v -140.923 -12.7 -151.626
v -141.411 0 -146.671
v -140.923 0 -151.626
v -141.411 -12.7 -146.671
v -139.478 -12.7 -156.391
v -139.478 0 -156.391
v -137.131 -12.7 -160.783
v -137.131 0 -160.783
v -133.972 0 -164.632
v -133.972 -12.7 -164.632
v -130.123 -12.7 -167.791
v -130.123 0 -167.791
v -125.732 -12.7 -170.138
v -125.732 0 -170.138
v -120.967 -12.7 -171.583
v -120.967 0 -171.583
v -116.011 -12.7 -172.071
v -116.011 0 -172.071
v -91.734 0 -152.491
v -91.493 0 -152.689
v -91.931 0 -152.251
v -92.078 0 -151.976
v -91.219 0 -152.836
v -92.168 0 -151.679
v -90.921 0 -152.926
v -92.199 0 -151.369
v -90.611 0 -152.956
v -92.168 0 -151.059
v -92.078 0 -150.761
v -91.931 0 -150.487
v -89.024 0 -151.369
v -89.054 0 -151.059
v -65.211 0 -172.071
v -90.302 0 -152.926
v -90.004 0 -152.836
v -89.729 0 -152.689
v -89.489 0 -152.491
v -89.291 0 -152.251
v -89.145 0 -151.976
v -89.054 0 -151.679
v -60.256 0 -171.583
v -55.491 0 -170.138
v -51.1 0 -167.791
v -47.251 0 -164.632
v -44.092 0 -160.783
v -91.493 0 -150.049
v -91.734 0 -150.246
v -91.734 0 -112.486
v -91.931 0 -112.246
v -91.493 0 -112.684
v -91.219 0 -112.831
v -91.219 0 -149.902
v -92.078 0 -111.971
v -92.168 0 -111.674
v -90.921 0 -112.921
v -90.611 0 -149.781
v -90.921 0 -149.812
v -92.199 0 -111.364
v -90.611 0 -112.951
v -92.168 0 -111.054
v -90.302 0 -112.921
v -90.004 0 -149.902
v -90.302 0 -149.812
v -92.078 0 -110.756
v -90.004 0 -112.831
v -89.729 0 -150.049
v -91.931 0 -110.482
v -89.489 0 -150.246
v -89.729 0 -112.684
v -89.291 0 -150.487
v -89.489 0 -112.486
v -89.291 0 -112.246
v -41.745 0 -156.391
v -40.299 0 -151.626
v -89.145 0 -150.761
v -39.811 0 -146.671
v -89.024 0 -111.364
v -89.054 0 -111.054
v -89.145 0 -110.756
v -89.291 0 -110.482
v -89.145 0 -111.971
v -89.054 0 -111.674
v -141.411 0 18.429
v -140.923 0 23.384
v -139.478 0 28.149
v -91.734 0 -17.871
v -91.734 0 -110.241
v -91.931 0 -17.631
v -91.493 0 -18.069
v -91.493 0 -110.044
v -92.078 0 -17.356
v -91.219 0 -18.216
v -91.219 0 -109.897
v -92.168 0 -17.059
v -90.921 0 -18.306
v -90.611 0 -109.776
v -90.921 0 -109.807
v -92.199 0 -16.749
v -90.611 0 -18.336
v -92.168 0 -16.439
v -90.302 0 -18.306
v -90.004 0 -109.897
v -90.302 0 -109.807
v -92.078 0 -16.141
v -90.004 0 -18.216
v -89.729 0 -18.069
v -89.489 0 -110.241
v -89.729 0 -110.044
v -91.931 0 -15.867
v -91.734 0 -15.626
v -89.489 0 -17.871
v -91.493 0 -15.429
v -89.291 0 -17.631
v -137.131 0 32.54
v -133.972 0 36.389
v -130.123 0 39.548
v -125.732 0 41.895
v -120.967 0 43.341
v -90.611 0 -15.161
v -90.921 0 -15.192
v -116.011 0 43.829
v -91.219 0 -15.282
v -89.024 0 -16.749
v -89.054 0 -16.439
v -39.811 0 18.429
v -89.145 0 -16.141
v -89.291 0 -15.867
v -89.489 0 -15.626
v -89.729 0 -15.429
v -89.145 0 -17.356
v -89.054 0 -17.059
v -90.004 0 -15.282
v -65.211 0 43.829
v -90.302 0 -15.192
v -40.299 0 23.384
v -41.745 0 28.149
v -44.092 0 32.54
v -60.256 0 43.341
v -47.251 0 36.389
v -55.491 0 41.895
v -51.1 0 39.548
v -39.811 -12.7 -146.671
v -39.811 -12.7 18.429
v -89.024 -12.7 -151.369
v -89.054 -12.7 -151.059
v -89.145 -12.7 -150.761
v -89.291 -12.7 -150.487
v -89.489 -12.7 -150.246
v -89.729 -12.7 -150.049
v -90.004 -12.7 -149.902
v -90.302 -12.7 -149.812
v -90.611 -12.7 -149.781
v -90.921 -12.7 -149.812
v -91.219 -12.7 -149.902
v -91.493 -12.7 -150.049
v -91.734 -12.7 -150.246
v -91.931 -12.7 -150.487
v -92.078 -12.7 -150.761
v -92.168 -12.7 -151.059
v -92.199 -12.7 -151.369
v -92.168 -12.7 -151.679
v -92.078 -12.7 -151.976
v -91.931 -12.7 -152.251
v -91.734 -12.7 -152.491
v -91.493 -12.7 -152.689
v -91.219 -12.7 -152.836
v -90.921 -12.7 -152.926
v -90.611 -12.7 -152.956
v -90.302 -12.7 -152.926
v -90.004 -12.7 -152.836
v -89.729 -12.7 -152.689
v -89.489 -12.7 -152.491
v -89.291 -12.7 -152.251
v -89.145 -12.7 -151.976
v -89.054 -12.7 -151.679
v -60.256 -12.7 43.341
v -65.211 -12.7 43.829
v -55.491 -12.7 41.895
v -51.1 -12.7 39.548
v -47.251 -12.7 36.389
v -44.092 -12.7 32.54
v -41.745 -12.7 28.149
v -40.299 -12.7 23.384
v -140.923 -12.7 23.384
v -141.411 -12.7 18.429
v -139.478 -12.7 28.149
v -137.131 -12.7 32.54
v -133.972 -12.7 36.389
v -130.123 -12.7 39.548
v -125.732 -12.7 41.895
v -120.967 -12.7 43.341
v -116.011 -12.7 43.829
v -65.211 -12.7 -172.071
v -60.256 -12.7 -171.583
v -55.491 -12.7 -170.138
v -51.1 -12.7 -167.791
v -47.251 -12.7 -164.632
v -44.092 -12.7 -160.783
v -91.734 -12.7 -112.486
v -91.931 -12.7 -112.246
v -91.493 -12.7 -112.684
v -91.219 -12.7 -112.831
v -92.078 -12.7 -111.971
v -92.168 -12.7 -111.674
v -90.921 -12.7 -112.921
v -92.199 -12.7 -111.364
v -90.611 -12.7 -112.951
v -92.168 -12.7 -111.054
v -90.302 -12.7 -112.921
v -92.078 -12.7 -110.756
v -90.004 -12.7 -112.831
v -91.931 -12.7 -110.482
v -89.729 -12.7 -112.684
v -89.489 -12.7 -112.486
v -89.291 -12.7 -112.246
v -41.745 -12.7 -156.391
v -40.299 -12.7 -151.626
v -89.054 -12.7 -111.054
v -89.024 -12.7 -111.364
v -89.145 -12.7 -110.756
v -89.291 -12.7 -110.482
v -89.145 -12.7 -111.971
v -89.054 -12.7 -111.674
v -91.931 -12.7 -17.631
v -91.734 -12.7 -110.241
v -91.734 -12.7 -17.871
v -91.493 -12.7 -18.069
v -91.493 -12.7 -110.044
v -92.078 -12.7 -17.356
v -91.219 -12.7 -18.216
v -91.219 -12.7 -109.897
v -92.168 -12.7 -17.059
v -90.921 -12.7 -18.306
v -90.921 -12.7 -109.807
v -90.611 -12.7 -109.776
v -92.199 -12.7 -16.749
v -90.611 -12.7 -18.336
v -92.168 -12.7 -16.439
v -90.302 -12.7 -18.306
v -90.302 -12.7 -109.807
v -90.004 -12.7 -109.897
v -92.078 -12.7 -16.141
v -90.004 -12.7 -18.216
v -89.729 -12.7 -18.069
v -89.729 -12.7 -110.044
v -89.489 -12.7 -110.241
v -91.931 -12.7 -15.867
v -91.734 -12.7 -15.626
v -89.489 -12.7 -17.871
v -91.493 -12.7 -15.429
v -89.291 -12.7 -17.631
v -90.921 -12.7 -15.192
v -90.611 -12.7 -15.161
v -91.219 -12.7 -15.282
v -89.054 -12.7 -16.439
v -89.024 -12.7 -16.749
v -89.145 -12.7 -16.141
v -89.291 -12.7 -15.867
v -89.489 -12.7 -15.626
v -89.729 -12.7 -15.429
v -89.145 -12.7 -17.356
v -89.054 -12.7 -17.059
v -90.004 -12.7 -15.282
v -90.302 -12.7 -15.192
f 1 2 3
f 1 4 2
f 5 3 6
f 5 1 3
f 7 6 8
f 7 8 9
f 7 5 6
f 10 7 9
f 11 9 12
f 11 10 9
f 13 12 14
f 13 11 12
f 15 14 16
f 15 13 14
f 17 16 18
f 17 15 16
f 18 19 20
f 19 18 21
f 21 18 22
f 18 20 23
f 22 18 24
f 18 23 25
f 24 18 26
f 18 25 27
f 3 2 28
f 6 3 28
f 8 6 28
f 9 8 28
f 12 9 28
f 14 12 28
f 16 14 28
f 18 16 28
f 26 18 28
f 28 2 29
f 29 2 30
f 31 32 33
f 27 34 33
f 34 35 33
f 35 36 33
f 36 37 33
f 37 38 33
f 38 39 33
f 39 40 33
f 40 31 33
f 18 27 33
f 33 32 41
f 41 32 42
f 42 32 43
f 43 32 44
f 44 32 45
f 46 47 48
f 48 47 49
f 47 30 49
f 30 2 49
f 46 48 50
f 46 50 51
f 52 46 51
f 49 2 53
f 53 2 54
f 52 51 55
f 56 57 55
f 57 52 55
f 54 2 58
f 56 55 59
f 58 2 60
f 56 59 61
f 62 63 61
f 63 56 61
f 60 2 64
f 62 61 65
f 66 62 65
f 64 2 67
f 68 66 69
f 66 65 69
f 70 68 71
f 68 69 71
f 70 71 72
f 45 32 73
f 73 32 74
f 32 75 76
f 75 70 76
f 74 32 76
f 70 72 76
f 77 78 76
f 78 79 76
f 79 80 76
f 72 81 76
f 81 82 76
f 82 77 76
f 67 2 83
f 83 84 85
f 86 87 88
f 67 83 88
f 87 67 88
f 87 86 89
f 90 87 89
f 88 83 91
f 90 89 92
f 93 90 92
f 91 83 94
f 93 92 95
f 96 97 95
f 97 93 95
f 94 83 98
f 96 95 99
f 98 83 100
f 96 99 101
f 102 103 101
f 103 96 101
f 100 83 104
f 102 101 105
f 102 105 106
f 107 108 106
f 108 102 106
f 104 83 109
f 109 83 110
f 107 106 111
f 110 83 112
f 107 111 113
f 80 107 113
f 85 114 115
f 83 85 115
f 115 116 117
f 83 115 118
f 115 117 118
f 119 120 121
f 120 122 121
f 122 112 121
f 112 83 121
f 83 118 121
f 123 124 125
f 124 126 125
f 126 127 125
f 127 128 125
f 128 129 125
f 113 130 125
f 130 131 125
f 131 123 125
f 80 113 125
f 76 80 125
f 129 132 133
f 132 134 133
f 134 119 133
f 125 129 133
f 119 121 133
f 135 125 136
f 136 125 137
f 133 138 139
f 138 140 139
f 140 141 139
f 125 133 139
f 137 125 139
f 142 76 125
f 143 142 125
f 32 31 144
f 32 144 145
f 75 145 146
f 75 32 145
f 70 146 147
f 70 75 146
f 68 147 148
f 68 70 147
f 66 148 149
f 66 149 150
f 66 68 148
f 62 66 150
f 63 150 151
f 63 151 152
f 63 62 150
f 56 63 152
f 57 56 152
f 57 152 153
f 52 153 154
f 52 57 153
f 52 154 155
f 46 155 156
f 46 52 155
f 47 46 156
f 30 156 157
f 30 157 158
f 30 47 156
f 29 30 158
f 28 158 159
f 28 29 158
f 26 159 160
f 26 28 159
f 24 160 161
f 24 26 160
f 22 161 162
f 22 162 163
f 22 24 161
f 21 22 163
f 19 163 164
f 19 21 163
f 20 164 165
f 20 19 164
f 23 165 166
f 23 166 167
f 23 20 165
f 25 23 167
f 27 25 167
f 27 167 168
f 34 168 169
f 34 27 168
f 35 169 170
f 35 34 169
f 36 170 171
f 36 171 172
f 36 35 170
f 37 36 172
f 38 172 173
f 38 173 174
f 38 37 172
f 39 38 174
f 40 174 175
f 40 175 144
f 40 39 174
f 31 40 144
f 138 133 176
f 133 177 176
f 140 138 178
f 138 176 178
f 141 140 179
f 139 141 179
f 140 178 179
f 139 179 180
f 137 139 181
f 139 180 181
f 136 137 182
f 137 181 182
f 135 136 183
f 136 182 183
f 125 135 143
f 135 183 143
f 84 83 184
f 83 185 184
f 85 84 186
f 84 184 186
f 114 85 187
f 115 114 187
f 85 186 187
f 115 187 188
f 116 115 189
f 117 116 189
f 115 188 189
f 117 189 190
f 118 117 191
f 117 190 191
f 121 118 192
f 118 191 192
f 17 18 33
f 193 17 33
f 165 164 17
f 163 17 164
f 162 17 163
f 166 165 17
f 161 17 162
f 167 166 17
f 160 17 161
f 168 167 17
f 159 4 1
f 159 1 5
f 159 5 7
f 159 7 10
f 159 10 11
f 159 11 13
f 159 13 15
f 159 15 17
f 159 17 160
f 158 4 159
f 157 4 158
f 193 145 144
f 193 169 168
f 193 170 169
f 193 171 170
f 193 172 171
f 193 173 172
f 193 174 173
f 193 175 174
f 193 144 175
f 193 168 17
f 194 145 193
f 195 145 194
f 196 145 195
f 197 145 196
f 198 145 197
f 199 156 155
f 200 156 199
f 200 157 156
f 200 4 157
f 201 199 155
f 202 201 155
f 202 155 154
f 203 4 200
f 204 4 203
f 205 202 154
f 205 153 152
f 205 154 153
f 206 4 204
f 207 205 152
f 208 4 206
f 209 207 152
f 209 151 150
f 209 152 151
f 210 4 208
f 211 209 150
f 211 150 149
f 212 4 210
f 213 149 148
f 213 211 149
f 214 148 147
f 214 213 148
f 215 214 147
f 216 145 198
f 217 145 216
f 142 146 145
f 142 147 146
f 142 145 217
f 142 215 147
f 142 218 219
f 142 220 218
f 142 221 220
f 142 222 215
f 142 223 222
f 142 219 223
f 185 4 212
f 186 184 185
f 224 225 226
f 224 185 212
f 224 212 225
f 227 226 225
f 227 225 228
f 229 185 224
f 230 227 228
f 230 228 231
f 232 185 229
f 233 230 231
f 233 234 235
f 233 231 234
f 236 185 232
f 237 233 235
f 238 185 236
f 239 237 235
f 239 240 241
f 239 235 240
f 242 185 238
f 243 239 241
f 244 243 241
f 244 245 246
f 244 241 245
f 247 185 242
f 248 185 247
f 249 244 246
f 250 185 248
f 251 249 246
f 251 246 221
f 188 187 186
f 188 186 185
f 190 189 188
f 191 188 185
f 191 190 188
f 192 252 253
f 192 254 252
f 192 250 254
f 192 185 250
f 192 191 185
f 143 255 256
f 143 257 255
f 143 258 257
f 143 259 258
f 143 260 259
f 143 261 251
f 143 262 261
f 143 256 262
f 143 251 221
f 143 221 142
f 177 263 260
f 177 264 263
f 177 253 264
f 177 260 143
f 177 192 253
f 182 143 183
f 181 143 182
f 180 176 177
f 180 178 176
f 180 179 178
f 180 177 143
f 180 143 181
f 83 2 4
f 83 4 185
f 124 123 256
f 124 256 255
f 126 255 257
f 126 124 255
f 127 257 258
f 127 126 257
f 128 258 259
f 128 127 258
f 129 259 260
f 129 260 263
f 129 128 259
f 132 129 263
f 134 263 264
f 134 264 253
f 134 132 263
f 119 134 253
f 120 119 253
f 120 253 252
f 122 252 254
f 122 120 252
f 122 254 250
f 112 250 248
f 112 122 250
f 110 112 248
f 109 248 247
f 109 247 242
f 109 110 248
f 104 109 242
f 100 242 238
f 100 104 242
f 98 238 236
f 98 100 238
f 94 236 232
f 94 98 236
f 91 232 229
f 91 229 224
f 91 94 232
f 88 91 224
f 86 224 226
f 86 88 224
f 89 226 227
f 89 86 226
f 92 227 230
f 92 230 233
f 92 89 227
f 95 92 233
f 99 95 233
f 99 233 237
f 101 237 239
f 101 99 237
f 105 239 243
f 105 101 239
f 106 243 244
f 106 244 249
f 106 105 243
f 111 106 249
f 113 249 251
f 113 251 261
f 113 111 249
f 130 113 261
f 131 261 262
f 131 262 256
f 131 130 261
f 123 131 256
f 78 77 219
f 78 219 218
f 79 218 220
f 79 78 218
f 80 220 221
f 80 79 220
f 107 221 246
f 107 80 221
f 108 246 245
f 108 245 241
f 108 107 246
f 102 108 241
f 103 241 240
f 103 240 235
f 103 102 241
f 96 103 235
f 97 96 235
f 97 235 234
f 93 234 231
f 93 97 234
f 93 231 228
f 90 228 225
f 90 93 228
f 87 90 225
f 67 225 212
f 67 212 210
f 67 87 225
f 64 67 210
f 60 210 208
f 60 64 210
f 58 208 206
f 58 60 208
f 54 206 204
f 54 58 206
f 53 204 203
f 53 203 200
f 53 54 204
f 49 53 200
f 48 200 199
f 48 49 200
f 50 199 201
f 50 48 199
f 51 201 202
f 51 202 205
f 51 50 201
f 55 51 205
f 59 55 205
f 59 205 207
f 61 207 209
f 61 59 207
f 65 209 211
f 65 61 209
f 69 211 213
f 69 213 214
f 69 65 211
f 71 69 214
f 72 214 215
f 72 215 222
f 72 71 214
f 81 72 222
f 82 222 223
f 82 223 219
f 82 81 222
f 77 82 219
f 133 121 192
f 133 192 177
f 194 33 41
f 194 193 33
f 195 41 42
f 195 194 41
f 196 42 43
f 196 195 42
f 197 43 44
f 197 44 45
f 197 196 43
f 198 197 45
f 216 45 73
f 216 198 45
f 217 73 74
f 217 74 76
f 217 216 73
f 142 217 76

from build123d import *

# Parameters (mm, degrees)
F0_W     = 101.6
F0_H     = 215.9
F0_R     = 1.5875
F1_DEPTH = 12.7
F2_R     = 25.4
F3_R     = 25.4
F4_R     = 25.4
F5_R     = 25.4


with BuildPart() as f1:
    # F0 (on Front) → F1 (new body)
    with BuildSketch(Plane.XZ):
        with Locations((-90.611439, -64.121174)):
            Rectangle(F0_W, F0_H)
        with Locations((-90.611439, -111.363955)):
            Circle(F0_R, mode=Mode.SUBTRACT)
        with Locations((-90.611439, -151.368955)):
            Circle(F0_R, mode=Mode.SUBTRACT)
        with Locations((-90.611439, -16.748955)):
            Circle(F0_R, mode=Mode.SUBTRACT)
    extrude(amount=F1_DEPTH)

    # F2
    f2_edges = [f1.edges().sort_by_distance(p)[0] for p in [
        (-141.411439, -6.35, 43.828826),
    ]]
    fillet(f2_edges, radius=F2_R)

    # F3
    f3_edges = [f1.edges().sort_by_distance(p)[0] for p in [
        (-39.811439, -6.35, 43.828826),
    ]]
    fillet(f3_edges, radius=F3_R)

    # F4
    f4_edges = [f1.edges().sort_by_distance(p)[0] for p in [
        (-141.411439, -6.35, -172.071174),
    ]]
    fillet(f4_edges, radius=F4_R)

    # F5
    f5_edges = [f1.edges().sort_by_distance(p)[0] for p in [
        (-39.811439, -6.35, -172.071174),
    ]]
    fillet(f5_edges, radius=F5_R)


solid = f1.part
